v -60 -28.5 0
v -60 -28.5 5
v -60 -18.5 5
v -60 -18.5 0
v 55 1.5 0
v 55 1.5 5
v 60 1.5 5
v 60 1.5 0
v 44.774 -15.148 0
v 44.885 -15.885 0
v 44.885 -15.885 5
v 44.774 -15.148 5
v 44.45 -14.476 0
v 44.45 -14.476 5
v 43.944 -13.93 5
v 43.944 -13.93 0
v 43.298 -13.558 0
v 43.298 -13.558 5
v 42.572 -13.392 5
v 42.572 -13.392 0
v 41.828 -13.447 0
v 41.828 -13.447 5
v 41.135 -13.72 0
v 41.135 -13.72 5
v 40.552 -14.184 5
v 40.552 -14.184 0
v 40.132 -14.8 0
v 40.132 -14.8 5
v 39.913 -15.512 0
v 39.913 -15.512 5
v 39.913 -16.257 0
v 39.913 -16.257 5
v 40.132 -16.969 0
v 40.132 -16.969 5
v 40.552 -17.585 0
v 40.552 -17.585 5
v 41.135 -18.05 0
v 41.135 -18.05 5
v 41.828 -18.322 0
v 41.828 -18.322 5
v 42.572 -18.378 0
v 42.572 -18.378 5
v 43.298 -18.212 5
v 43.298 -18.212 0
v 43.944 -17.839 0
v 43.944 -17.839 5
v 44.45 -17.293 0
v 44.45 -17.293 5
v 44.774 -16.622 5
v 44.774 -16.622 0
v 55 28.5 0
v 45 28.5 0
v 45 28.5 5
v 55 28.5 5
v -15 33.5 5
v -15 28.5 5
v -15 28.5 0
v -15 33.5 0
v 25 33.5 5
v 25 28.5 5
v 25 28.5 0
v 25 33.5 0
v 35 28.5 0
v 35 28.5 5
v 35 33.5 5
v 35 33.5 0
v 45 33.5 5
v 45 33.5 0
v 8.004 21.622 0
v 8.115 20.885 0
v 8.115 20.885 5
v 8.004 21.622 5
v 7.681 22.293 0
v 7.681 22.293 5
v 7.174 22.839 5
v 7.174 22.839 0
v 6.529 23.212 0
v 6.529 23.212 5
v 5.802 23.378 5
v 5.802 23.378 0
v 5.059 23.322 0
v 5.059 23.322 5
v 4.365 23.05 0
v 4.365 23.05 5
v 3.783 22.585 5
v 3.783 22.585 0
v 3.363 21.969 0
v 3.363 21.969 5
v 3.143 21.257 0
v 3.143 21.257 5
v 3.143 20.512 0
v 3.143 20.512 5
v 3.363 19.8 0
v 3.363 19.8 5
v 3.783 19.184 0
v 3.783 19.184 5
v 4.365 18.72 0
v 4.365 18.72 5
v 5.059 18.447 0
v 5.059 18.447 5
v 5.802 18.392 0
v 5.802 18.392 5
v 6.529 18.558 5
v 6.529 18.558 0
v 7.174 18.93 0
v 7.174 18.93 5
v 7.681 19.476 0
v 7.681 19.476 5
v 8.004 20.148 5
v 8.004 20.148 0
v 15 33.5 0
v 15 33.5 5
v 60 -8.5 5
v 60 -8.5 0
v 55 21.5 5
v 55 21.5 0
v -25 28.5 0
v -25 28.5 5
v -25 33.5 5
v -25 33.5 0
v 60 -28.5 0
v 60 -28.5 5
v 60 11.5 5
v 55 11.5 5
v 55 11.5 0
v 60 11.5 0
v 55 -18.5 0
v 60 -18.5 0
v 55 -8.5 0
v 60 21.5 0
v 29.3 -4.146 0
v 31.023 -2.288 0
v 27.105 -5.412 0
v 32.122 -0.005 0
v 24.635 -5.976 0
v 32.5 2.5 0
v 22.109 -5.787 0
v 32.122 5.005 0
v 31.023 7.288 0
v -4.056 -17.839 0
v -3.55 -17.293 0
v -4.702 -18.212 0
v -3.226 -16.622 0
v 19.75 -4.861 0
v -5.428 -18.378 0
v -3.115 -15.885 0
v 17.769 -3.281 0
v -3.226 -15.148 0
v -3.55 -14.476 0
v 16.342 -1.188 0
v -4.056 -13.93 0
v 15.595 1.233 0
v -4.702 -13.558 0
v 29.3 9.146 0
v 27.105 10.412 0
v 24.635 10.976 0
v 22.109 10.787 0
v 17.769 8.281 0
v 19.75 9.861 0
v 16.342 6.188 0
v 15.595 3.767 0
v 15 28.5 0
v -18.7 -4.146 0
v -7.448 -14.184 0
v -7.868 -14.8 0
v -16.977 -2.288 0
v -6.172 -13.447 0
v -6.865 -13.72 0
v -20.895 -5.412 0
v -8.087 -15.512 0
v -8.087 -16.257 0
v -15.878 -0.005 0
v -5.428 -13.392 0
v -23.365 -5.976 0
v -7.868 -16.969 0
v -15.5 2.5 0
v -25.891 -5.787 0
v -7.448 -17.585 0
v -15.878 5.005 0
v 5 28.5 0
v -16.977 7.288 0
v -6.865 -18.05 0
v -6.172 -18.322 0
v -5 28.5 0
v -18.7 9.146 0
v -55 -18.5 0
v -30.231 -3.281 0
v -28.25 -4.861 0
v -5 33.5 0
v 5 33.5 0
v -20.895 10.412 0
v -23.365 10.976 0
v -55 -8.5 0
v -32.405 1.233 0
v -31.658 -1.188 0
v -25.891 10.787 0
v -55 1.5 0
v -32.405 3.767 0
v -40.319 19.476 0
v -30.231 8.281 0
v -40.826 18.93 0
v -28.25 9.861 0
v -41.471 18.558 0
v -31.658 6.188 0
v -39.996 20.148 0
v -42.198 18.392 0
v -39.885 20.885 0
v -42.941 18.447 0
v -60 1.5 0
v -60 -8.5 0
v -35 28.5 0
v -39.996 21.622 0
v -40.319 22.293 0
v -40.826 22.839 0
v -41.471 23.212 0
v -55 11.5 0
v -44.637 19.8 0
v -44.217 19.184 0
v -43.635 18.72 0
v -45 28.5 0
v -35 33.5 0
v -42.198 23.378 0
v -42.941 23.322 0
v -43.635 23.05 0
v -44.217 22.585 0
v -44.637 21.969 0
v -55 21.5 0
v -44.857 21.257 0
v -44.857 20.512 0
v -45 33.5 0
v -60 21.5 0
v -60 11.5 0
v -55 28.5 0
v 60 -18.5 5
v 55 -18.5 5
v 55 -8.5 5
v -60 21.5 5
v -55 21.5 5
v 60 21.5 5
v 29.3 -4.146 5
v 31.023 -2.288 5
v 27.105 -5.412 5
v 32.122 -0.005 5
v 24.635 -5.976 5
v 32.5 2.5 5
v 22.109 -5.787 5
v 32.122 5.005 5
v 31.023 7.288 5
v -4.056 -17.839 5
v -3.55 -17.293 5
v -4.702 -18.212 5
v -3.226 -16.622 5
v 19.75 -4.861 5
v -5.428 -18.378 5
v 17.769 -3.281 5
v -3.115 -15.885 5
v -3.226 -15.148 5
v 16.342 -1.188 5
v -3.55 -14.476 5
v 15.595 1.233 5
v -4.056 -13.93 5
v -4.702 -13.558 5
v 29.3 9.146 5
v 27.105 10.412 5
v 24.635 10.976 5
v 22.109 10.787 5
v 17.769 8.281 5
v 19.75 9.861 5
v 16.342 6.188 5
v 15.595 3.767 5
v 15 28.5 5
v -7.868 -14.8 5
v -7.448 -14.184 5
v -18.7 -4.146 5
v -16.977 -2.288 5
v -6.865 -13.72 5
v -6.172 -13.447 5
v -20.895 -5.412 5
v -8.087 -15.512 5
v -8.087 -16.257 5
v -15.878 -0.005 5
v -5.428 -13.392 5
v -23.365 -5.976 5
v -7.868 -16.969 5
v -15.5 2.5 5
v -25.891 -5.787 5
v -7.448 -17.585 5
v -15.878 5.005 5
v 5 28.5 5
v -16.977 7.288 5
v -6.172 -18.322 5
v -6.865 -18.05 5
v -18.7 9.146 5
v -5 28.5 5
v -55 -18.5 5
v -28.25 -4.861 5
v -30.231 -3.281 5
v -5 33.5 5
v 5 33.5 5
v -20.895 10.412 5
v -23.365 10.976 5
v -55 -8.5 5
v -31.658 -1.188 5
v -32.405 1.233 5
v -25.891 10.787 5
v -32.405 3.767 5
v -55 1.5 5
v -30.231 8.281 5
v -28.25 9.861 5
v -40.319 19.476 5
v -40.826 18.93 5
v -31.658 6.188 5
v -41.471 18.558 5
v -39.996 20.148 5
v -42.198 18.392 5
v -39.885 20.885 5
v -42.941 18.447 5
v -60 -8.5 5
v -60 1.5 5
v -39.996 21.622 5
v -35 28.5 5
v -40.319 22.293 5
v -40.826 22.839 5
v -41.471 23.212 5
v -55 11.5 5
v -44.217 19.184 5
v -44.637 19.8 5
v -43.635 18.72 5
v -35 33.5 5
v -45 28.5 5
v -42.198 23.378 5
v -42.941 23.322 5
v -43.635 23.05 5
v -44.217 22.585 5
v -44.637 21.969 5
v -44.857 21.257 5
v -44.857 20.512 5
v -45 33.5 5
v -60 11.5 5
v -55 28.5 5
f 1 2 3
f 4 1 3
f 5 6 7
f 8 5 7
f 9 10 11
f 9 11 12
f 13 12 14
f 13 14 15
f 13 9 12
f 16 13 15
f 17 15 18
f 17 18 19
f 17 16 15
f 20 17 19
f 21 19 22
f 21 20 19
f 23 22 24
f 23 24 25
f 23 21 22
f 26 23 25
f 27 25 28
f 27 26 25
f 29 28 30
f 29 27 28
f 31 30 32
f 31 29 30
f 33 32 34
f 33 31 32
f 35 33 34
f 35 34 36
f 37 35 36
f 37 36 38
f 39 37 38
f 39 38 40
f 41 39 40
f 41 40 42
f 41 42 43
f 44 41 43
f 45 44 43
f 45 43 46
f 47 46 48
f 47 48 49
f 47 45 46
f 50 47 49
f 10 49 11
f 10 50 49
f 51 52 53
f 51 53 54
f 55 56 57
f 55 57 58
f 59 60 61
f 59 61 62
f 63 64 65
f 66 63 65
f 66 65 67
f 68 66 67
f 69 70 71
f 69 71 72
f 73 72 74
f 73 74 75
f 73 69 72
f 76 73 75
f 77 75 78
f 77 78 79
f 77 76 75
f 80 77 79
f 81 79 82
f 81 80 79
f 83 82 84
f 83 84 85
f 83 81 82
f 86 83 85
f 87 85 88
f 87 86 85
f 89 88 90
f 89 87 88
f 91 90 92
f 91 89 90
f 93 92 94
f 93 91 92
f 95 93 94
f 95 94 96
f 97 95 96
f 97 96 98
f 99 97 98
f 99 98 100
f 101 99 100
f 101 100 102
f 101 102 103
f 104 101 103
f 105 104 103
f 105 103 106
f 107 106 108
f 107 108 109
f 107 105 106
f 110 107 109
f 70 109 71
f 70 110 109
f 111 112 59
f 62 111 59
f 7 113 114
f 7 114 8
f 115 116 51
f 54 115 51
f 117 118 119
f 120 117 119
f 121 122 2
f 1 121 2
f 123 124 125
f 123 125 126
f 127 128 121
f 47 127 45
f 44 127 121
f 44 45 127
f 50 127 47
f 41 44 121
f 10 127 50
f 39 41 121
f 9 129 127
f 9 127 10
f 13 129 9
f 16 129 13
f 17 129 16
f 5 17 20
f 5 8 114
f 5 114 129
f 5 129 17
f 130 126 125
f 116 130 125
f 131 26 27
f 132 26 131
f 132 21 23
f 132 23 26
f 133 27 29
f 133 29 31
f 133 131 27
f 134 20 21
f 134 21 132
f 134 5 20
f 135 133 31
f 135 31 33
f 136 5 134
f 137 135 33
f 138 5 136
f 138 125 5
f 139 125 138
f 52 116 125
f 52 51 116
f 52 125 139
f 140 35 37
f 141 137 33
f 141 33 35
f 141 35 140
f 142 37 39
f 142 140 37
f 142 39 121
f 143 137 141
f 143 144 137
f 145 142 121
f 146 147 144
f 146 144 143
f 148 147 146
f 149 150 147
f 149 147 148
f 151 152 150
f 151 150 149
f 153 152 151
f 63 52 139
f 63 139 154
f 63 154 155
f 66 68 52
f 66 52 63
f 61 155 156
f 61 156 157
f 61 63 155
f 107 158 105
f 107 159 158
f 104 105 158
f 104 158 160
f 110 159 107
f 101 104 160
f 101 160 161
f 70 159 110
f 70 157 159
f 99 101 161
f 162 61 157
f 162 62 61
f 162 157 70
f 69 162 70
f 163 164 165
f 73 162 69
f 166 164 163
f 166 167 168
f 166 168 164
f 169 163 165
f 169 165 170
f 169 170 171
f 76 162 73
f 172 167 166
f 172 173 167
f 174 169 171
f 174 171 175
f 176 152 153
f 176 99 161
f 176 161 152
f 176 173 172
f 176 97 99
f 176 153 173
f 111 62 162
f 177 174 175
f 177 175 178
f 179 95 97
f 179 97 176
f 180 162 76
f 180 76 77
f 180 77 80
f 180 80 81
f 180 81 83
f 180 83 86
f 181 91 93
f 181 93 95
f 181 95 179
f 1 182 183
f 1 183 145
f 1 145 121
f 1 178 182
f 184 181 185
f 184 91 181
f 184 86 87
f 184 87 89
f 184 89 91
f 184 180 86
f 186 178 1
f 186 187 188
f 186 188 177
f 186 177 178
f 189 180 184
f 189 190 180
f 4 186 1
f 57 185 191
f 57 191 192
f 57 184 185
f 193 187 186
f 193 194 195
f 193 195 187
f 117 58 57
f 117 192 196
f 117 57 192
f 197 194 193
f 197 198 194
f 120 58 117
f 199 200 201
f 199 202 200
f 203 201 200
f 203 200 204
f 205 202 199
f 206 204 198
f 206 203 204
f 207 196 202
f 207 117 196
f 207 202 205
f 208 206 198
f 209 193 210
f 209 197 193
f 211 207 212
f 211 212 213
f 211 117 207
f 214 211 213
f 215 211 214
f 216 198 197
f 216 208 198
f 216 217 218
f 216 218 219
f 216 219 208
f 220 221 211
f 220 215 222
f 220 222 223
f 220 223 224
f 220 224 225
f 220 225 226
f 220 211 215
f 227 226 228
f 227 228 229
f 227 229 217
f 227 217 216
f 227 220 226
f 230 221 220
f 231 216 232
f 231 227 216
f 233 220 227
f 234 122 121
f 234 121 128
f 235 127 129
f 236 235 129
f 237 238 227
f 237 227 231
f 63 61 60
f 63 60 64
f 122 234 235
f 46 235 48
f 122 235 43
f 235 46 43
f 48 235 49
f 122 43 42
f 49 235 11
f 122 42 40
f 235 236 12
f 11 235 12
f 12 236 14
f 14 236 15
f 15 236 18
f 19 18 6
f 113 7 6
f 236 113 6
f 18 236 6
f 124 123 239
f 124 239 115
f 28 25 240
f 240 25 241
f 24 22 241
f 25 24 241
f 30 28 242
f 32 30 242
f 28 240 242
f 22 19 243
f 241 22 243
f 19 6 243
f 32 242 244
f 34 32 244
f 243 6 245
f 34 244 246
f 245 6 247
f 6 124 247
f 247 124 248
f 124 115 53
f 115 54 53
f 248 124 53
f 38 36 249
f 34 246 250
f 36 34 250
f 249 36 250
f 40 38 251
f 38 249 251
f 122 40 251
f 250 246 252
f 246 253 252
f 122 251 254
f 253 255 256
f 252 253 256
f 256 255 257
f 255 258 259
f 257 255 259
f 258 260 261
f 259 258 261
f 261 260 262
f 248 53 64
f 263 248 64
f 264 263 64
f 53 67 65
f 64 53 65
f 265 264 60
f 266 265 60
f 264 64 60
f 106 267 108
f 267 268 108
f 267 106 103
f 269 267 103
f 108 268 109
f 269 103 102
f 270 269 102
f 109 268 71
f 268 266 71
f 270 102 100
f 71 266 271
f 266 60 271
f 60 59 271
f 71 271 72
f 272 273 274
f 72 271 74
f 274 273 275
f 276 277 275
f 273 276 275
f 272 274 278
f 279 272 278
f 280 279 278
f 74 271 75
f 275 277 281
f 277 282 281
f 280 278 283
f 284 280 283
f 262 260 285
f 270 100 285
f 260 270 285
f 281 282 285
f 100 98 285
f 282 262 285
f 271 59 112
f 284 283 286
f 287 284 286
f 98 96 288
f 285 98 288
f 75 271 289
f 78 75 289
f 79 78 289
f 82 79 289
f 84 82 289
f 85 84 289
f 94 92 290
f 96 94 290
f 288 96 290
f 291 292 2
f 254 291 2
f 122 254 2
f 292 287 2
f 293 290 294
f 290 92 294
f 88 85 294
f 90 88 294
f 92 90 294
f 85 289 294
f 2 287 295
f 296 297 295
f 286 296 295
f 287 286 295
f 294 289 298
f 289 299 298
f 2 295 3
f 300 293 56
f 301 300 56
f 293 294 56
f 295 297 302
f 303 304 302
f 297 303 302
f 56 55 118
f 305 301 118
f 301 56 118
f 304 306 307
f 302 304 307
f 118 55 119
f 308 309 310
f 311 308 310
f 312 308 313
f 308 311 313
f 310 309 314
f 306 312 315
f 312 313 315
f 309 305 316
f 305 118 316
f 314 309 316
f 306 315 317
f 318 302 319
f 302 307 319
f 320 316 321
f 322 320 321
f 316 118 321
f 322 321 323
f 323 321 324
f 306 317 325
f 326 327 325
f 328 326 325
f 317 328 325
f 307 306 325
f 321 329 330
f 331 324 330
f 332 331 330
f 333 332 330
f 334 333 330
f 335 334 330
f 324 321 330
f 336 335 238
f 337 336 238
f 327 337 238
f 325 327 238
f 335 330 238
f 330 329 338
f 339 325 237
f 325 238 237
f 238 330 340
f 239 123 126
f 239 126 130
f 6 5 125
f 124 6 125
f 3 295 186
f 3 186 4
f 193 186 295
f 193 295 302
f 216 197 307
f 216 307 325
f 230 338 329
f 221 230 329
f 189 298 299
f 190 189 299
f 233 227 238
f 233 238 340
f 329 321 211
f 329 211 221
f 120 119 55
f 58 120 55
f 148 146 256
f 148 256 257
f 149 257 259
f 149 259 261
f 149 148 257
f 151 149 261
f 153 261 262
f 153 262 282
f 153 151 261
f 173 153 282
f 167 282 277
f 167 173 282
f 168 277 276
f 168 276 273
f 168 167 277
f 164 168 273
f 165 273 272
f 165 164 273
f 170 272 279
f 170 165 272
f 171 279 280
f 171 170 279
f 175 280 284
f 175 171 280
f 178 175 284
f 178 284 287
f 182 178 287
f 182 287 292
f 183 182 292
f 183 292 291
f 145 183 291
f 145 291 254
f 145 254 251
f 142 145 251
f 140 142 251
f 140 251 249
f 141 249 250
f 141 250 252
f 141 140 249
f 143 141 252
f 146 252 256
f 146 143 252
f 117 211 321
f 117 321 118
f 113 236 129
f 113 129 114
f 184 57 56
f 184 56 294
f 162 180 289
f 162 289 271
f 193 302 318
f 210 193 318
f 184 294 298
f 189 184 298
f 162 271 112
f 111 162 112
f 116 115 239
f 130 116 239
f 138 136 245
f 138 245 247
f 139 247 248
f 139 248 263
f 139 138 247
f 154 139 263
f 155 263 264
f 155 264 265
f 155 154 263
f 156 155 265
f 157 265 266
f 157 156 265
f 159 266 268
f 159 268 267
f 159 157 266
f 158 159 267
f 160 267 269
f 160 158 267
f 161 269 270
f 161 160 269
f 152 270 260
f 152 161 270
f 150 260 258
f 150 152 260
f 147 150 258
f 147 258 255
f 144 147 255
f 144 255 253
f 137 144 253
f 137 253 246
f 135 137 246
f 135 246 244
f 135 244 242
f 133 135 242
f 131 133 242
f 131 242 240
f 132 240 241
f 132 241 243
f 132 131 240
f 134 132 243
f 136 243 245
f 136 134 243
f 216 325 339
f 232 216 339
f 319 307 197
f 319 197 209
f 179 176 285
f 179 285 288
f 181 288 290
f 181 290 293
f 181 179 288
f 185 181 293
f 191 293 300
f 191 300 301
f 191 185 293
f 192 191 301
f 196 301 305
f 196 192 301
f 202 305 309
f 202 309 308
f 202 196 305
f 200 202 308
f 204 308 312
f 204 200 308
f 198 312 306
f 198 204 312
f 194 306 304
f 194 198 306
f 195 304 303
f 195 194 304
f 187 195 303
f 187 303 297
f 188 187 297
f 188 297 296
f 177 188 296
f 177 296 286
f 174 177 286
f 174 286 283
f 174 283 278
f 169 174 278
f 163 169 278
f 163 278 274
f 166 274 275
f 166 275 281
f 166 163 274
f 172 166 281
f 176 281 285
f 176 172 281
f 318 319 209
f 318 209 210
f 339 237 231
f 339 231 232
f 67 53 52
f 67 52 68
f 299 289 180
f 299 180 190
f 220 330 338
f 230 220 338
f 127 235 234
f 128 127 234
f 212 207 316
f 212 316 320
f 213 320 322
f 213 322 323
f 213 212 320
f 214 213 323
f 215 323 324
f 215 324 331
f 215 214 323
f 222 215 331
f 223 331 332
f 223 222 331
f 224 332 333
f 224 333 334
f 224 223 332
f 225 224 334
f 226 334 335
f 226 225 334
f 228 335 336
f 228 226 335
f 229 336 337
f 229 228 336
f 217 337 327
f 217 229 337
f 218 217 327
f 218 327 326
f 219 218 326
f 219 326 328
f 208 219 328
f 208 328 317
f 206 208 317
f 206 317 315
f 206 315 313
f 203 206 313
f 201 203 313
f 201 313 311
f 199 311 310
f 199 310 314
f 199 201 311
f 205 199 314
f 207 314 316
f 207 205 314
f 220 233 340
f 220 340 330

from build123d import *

# Parameters (mm, degrees)
SKETCH_1_W               = 110
SKETCH_1_H               = 57
SKETCH_1_R               = 8.5
SKETCH_1_R_2             = 2.5
EXTRUDE_1_DEPTH          = 5
SKETCH_2_W               = 5
SKETCH_2_H               = 10
EXTRUDE_2_DEPTH          = 5
PATTERN_LINEAR_1_COUNT   = 3
PATTERN_LINEAR_1_PITCH   = 20
MIRROR_1_COPY_1_SKETCH_W = 5
MIRROR_1_COPY_1_SKETCH_H = 10
MIRROR_1_COPY_1_DEPTH    = 5
MIRROR_1_COPY_2_SKETCH_W = 5
MIRROR_1_COPY_2_SKETCH_H = 10
MIRROR_1_COPY_2_DEPTH    = 5
SKETCH_3_W               = 10
SKETCH_3_H               = 5
EXTRUDE_3_DEPTH          = 5
PATTERN_LINEAR_2_COUNT   = 3
PATTERN_LINEAR_2_PITCH   = 20
PATTERN_LINEAR_3_COUNT   = 3
PATTERN_LINEAR_3_PITCH   = 20


with BuildPart() as part:
    # 스케치1 → 보스-돌출1 (new body)
    with BuildSketch(Plane.XY):
        Rectangle(SKETCH_1_W, SKETCH_1_H)
        with Locations((24, 2.5)):
            Circle(SKETCH_1_R, mode=Mode.SUBTRACT)
        with Locations((-24, 2.5)):
            Circle(SKETCH_1_R, mode=Mode.SUBTRACT)
        with Locations((-42.384776311, 20.884776311)):
            Circle(SKETCH_1_R_2, mode=Mode.SUBTRACT)
        with Locations((-5.615223689, -15.884776311)):
            Circle(SKETCH_1_R_2, mode=Mode.SUBTRACT)
        with Locations((5.615223689, 20.884776311)):
            Circle(SKETCH_1_R_2, mode=Mode.SUBTRACT)
        with Locations((42.384776311, -15.884776311)):
            Circle(SKETCH_1_R_2, mode=Mode.SUBTRACT)
    extrude(amount=EXTRUDE_1_DEPTH)

    # 스케치2 → 보스-돌출2 (add)
    with BuildSketch(Plane.XY.offset(5)):
        with Locations((57.5, -23.5)):
            Rectangle(SKETCH_2_W, SKETCH_2_H)
    extrude_2 = extrude(amount=-EXTRUDE_2_DEPTH)

    # 선형 패턴1: 보스-돌출2 ×3
    with Locations(*[(0, i * PATTERN_LINEAR_1_PITCH, 0) for i in range(1, PATTERN_LINEAR_1_COUNT)]):
        add(extrude_2)

    # 대칭 복사1: 보스-돌출2 across plane
    add(extrude_2.mirror(Plane(origin=(0, 0, 0), x_dir=(0, 0, 1), z_dir=(1, 0, 0))))

    # 대칭 복사1 copy 1 sketch → 대칭 복사1 copy 1 (add)
    with BuildSketch(Plane(origin=(0, 20, 5), x_dir=(-1, 0, 0), z_dir=(0, 0, 1))):
        with Locations((57.5, 23.5)):
            Rectangle(MIRROR_1_COPY_1_SKETCH_W, MIRROR_1_COPY_1_SKETCH_H)
    extrude(amount=-MIRROR_1_COPY_1_DEPTH)

    # 대칭 복사1 copy 2 sketch → 대칭 복사1 copy 2 (add)
    with BuildSketch(Plane(origin=(0, 40, 5), x_dir=(-1, 0, 0), z_dir=(0, 0, 1))):
        with Locations((57.5, 23.5)):
            Rectangle(MIRROR_1_COPY_2_SKETCH_W, MIRROR_1_COPY_2_SKETCH_H)
    extrude(amount=-MIRROR_1_COPY_2_DEPTH)

    # 스케치3 → 보스-돌출3 (add)
    with BuildSketch(Plane.XY.offset(5)):
        with Locations((0, 31)):
            Rectangle(SKETCH_3_W, SKETCH_3_H)
    extrude_3 = extrude(amount=-EXTRUDE_3_DEPTH)

    # 선형 패턴2: 보스-돌출3 ×3
    with Locations(*[(i * PATTERN_LINEAR_2_PITCH, 0, 0) for i in range(1, PATTERN_LINEAR_2_COUNT)]):
        add(extrude_3)

    # 선형 패턴3: 보스-돌출3 ×3
    with Locations(*[(-i * PATTERN_LINEAR_3_PITCH, 0, 0) for i in range(1, PATTERN_LINEAR_3_COUNT)]):
        add(extrude_3)


solid = part.part
